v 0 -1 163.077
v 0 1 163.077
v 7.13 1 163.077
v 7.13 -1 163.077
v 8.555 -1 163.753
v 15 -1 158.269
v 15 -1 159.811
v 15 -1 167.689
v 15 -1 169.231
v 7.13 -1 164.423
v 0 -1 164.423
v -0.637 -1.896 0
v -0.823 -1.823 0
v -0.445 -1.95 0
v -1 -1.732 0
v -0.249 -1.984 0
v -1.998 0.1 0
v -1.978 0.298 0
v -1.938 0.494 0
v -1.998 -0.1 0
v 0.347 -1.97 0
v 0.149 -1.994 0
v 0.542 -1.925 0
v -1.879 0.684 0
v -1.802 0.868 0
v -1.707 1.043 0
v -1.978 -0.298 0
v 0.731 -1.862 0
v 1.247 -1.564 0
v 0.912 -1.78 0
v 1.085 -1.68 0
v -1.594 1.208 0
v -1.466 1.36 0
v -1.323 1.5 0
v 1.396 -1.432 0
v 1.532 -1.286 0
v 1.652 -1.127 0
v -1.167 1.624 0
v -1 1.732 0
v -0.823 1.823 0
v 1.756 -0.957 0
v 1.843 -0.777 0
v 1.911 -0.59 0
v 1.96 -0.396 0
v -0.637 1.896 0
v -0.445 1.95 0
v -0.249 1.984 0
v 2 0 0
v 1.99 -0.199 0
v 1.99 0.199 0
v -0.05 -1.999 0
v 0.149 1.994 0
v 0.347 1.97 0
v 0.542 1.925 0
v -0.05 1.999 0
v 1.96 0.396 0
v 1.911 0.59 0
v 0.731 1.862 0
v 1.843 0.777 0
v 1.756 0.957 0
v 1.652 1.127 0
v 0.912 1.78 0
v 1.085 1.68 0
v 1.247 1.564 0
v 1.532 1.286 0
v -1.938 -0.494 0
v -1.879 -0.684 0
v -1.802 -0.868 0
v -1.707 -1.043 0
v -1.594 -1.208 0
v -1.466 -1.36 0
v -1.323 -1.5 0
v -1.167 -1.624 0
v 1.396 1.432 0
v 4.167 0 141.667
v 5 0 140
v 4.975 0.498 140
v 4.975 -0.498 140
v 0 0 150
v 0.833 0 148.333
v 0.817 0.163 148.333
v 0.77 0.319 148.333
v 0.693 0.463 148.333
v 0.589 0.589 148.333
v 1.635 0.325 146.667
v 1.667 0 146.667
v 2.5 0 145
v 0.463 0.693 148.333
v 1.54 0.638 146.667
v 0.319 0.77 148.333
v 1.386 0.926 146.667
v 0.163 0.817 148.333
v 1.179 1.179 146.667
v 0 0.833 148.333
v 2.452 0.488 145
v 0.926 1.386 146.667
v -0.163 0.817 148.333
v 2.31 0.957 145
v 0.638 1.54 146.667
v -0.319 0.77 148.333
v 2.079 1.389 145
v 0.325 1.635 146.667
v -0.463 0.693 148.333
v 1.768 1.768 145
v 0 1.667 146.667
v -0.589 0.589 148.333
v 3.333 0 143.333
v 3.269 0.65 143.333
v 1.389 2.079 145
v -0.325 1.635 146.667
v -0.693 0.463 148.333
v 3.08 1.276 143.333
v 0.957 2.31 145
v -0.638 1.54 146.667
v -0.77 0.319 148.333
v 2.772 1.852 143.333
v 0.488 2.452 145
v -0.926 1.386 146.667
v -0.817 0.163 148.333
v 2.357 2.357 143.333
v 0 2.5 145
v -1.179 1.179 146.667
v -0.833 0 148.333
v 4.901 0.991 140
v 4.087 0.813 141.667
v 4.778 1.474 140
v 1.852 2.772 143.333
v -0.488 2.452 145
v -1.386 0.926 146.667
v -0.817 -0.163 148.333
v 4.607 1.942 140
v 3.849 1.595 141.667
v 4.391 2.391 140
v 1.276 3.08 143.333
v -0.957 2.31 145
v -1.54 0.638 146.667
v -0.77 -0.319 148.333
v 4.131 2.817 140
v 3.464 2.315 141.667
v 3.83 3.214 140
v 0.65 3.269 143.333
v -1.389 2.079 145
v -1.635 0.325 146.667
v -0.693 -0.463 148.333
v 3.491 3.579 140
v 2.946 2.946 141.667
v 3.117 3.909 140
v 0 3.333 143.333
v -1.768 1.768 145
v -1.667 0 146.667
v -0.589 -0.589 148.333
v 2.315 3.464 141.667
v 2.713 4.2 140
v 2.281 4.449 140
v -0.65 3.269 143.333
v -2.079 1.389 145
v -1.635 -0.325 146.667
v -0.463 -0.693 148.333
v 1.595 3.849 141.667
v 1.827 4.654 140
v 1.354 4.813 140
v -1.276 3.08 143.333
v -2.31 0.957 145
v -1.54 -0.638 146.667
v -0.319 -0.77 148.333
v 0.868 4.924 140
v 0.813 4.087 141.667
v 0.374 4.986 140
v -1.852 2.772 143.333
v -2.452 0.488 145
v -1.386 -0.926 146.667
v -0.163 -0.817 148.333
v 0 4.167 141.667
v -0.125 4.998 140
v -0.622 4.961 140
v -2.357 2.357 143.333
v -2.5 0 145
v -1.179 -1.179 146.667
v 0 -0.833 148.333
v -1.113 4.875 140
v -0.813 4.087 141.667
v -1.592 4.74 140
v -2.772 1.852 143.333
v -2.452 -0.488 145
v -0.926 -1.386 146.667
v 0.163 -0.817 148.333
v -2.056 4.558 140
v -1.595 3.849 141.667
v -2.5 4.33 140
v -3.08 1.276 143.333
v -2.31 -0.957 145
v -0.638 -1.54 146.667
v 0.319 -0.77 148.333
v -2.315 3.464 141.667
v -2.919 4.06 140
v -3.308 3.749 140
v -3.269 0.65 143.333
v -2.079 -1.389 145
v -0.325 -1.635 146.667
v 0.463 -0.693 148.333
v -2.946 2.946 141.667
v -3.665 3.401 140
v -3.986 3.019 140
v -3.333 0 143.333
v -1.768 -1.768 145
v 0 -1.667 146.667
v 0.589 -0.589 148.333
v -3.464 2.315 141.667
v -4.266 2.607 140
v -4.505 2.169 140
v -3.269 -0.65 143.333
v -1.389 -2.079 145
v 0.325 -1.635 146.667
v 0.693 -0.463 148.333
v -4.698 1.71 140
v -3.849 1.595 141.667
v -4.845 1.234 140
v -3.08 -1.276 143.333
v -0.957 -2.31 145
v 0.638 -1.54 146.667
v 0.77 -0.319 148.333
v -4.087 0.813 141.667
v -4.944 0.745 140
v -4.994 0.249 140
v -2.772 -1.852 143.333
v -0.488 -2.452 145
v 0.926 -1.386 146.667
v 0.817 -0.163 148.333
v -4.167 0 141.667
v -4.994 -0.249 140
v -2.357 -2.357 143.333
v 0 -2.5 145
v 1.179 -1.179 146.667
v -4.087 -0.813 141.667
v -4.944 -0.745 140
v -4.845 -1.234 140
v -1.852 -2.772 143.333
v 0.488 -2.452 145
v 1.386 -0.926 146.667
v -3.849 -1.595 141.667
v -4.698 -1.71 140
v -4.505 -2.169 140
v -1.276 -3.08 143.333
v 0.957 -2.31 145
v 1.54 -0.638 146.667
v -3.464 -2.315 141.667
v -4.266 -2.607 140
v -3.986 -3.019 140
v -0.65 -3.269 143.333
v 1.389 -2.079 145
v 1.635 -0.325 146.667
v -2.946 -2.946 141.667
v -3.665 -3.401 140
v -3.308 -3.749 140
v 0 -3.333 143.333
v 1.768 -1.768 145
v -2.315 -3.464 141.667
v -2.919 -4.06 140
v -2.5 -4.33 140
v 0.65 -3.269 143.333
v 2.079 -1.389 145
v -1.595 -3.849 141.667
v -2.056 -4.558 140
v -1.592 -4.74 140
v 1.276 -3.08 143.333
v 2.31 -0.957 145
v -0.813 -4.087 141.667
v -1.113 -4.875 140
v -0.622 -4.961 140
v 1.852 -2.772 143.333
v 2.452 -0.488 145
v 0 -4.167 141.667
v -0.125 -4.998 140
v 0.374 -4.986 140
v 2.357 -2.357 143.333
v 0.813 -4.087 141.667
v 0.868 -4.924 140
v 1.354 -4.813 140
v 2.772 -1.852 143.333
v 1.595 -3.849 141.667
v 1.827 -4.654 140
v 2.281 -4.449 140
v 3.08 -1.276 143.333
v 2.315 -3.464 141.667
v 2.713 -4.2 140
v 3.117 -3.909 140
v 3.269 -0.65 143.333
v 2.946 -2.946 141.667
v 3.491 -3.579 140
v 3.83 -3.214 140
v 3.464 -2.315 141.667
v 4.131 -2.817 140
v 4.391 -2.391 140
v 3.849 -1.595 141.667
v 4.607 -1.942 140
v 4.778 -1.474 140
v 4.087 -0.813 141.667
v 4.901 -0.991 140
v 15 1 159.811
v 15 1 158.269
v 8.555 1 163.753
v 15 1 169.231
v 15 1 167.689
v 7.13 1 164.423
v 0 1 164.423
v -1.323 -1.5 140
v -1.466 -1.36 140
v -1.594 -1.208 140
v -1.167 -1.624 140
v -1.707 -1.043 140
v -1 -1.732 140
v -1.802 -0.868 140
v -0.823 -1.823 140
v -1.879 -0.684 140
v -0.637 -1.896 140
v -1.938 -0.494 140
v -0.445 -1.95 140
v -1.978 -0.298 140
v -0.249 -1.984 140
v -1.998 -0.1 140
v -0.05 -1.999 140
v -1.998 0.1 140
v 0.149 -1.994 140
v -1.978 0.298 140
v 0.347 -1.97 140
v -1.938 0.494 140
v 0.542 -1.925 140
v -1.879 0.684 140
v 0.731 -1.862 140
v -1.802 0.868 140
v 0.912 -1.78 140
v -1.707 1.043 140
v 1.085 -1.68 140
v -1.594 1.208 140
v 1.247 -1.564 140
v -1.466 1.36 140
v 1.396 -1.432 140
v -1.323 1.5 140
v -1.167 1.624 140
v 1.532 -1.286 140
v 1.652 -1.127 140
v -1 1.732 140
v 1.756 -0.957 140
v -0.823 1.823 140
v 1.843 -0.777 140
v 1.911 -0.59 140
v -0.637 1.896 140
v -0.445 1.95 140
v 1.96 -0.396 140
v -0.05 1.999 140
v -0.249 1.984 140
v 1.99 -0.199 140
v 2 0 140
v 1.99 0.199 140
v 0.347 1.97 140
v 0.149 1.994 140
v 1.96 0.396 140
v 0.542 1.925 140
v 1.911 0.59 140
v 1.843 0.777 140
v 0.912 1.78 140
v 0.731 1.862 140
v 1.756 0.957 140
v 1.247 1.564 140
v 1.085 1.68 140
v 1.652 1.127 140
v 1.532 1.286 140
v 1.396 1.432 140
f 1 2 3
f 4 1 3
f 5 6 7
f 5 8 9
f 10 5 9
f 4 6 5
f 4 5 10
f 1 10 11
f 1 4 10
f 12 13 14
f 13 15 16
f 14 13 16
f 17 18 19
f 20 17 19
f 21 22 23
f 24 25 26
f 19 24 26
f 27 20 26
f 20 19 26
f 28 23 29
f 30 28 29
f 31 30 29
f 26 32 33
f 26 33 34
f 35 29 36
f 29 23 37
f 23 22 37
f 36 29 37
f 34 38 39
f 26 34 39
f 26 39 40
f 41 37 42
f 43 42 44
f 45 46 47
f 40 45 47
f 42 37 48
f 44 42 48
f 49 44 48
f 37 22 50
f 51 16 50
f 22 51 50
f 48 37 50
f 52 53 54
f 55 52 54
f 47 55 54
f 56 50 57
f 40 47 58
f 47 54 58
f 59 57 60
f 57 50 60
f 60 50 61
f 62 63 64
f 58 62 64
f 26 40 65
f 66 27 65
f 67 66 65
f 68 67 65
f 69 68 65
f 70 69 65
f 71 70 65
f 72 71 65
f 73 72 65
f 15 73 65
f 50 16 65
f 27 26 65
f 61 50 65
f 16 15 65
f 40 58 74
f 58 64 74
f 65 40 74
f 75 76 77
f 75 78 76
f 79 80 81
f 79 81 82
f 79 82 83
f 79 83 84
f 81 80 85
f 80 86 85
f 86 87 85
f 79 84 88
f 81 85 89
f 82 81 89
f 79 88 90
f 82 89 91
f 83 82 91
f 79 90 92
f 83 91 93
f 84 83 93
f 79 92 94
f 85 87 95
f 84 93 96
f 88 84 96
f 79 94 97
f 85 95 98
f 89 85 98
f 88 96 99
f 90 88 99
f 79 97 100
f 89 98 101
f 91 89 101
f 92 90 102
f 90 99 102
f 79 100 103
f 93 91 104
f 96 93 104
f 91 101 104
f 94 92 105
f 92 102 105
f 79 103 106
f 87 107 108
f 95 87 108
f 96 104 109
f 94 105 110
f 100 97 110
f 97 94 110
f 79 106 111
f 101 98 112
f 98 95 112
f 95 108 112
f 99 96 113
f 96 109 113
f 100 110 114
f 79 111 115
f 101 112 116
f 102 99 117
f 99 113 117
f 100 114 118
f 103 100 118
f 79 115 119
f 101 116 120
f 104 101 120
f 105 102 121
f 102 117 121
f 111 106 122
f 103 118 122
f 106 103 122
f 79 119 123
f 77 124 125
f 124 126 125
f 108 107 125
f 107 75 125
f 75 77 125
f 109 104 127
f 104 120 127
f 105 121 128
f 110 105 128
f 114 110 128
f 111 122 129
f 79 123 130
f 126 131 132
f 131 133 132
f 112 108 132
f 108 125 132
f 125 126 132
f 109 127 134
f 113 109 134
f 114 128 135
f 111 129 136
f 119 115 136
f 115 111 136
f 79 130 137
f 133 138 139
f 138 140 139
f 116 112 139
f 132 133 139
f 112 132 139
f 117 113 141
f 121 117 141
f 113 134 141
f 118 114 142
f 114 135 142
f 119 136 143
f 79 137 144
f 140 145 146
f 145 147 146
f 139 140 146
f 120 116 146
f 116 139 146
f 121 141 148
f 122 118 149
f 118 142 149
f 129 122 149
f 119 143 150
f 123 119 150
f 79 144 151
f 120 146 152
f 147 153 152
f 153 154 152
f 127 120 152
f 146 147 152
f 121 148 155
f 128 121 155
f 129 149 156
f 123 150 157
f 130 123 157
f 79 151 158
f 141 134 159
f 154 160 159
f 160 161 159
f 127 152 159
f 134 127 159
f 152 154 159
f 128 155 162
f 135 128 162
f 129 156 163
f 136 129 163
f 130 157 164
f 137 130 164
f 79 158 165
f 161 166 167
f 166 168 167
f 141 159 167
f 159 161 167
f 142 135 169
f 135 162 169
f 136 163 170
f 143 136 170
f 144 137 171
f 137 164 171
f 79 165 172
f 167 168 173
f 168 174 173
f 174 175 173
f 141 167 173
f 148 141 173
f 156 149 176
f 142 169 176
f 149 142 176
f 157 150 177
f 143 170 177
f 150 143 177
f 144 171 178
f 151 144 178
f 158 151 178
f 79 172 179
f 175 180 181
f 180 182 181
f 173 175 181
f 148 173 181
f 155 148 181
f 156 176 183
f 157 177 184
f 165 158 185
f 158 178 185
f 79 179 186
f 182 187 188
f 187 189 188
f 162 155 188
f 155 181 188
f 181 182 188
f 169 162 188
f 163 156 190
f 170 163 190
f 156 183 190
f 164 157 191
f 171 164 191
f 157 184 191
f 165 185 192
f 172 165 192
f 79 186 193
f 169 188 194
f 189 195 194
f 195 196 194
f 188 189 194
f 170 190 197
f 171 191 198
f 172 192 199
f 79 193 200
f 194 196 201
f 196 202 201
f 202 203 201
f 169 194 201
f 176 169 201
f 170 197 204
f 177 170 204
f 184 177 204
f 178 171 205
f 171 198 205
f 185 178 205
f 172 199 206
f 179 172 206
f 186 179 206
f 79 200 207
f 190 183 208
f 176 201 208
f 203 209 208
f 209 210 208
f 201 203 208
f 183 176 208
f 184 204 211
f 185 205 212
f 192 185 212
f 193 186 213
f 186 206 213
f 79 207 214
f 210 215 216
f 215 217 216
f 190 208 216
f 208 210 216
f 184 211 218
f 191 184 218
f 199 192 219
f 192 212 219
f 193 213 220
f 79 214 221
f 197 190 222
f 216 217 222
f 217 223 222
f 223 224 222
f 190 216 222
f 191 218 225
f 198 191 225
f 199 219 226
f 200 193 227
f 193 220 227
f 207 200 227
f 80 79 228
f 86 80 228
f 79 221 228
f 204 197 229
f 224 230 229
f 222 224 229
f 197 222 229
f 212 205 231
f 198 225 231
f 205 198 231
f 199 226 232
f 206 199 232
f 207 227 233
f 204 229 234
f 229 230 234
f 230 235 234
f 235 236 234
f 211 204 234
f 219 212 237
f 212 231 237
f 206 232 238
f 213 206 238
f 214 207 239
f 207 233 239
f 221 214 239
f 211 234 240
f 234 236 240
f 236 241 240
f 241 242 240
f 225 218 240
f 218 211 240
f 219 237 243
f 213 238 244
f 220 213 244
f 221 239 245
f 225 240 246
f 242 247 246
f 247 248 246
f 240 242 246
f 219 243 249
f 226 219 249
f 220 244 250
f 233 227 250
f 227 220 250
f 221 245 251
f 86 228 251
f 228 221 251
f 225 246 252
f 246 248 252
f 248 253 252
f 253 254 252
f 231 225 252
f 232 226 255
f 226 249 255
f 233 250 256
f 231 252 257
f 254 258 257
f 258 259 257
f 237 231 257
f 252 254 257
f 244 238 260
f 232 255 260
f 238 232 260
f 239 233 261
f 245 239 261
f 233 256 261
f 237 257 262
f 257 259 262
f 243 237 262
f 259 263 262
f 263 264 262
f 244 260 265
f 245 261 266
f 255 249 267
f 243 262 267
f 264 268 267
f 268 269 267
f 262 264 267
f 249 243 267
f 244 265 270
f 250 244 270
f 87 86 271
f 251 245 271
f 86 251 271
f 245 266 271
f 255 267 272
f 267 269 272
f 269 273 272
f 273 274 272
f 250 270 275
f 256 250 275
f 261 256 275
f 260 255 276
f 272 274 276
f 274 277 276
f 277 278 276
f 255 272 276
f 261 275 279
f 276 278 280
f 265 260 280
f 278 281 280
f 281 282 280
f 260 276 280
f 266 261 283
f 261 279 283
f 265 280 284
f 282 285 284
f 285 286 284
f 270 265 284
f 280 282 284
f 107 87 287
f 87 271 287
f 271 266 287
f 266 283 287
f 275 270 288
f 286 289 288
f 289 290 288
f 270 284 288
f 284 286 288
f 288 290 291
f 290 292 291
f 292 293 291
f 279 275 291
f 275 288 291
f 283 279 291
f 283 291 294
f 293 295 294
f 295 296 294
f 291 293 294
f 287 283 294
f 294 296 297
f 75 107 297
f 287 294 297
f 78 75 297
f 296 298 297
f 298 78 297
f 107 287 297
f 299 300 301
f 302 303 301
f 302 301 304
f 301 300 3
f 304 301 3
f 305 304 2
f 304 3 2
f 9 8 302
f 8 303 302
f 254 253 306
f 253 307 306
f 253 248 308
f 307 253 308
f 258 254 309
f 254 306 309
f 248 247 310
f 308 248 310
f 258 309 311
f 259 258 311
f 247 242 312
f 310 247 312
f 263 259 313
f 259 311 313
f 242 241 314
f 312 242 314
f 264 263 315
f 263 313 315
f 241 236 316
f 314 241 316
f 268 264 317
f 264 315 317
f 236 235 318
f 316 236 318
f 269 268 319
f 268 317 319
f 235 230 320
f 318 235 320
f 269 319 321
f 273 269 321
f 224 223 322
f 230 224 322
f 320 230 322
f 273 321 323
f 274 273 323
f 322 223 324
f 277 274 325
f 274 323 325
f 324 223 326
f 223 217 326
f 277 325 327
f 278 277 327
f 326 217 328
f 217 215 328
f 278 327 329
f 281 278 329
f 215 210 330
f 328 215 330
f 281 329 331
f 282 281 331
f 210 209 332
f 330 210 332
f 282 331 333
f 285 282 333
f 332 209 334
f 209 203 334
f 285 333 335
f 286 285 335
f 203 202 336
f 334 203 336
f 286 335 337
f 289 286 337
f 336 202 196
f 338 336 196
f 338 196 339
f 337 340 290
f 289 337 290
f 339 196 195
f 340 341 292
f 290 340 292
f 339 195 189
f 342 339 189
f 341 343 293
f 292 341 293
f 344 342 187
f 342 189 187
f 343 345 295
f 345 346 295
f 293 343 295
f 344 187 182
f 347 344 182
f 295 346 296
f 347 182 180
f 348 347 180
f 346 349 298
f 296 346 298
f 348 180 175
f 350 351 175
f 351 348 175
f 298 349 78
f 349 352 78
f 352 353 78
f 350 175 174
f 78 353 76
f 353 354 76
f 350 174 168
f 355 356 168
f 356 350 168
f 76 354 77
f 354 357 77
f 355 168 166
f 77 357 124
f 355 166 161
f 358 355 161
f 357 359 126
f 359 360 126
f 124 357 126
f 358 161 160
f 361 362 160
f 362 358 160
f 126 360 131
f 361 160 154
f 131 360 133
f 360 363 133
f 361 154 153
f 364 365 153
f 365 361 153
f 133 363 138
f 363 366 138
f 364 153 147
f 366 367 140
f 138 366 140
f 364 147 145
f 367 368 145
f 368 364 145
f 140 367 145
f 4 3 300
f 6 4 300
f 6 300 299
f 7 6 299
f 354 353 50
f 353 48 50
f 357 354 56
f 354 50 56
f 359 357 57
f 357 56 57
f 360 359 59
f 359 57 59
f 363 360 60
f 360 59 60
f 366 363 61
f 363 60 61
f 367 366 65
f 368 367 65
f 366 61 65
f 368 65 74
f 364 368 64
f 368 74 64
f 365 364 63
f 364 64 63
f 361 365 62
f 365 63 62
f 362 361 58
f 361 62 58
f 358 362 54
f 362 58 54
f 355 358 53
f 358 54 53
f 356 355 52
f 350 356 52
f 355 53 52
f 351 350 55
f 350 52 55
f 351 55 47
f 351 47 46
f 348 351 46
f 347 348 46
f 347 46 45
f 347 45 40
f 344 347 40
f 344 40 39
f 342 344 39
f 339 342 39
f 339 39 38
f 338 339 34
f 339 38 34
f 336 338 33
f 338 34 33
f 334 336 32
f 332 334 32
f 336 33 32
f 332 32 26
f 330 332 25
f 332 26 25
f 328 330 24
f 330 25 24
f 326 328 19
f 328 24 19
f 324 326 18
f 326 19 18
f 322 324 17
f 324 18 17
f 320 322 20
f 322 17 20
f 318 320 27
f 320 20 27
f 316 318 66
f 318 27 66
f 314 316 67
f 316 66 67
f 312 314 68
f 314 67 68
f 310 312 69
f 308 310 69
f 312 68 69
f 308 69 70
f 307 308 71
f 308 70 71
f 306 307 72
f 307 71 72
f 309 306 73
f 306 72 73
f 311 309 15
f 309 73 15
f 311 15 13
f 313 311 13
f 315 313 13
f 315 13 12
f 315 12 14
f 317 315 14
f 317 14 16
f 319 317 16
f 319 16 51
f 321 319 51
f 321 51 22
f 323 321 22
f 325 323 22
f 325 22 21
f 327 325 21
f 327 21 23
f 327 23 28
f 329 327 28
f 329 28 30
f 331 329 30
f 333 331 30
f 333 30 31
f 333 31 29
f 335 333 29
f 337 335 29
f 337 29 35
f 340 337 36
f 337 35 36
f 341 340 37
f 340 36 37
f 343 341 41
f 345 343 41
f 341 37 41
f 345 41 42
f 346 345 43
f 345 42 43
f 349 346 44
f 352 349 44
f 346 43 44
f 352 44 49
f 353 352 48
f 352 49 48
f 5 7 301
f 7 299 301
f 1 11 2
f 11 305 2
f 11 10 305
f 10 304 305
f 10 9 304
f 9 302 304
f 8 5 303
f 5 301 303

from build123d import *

# Parameters (mm, degrees)
BOSS_EXTRUDE1_DEPTH      = 1
BOSS_EXTRUDE1_DEPTH_BACK = 1


with BuildPart() as part:
    # Sketch2 → Revolve1 (revolve)
    with BuildSketch(Plane(origin=(0, 0, 0), x_dir=(1, 0, 0), z_dir=(0, 1, 0))):
        Polygon((0, -150), (5, -140), (2, -140), (2, 0), (0, 0), align=None)
    revolve(axis=Axis((0, 0, -41.949952025), (0, 0, 1)))


with BuildPart() as body_2:
    # Sketch3 → Boss-Extrude1 (new, two sides: drawn at the far end of the back side and taken through both)
    with BuildSketch(Plane(origin=(0, 0, 0), x_dir=(1, 0, 0), z_dir=(0, 1, 0)).offset(-BOSS_EXTRUDE1_DEPTH_BACK)):
        Polygon((15, -158.269230769), (15, -159.810697115), (8.5546875, -163.753004808), (15, -167.689302885), (15, -169.230769231), (7.130408654, -164.423076923), (0, -164.423076923), (0, -163.076923077), (7.130408654, -163.076923077), align=None)
    extrude(amount=BOSS_EXTRUDE1_DEPTH + BOSS_EXTRUDE1_DEPTH_BACK)


solid = Compound([part.part, body_2.part])
